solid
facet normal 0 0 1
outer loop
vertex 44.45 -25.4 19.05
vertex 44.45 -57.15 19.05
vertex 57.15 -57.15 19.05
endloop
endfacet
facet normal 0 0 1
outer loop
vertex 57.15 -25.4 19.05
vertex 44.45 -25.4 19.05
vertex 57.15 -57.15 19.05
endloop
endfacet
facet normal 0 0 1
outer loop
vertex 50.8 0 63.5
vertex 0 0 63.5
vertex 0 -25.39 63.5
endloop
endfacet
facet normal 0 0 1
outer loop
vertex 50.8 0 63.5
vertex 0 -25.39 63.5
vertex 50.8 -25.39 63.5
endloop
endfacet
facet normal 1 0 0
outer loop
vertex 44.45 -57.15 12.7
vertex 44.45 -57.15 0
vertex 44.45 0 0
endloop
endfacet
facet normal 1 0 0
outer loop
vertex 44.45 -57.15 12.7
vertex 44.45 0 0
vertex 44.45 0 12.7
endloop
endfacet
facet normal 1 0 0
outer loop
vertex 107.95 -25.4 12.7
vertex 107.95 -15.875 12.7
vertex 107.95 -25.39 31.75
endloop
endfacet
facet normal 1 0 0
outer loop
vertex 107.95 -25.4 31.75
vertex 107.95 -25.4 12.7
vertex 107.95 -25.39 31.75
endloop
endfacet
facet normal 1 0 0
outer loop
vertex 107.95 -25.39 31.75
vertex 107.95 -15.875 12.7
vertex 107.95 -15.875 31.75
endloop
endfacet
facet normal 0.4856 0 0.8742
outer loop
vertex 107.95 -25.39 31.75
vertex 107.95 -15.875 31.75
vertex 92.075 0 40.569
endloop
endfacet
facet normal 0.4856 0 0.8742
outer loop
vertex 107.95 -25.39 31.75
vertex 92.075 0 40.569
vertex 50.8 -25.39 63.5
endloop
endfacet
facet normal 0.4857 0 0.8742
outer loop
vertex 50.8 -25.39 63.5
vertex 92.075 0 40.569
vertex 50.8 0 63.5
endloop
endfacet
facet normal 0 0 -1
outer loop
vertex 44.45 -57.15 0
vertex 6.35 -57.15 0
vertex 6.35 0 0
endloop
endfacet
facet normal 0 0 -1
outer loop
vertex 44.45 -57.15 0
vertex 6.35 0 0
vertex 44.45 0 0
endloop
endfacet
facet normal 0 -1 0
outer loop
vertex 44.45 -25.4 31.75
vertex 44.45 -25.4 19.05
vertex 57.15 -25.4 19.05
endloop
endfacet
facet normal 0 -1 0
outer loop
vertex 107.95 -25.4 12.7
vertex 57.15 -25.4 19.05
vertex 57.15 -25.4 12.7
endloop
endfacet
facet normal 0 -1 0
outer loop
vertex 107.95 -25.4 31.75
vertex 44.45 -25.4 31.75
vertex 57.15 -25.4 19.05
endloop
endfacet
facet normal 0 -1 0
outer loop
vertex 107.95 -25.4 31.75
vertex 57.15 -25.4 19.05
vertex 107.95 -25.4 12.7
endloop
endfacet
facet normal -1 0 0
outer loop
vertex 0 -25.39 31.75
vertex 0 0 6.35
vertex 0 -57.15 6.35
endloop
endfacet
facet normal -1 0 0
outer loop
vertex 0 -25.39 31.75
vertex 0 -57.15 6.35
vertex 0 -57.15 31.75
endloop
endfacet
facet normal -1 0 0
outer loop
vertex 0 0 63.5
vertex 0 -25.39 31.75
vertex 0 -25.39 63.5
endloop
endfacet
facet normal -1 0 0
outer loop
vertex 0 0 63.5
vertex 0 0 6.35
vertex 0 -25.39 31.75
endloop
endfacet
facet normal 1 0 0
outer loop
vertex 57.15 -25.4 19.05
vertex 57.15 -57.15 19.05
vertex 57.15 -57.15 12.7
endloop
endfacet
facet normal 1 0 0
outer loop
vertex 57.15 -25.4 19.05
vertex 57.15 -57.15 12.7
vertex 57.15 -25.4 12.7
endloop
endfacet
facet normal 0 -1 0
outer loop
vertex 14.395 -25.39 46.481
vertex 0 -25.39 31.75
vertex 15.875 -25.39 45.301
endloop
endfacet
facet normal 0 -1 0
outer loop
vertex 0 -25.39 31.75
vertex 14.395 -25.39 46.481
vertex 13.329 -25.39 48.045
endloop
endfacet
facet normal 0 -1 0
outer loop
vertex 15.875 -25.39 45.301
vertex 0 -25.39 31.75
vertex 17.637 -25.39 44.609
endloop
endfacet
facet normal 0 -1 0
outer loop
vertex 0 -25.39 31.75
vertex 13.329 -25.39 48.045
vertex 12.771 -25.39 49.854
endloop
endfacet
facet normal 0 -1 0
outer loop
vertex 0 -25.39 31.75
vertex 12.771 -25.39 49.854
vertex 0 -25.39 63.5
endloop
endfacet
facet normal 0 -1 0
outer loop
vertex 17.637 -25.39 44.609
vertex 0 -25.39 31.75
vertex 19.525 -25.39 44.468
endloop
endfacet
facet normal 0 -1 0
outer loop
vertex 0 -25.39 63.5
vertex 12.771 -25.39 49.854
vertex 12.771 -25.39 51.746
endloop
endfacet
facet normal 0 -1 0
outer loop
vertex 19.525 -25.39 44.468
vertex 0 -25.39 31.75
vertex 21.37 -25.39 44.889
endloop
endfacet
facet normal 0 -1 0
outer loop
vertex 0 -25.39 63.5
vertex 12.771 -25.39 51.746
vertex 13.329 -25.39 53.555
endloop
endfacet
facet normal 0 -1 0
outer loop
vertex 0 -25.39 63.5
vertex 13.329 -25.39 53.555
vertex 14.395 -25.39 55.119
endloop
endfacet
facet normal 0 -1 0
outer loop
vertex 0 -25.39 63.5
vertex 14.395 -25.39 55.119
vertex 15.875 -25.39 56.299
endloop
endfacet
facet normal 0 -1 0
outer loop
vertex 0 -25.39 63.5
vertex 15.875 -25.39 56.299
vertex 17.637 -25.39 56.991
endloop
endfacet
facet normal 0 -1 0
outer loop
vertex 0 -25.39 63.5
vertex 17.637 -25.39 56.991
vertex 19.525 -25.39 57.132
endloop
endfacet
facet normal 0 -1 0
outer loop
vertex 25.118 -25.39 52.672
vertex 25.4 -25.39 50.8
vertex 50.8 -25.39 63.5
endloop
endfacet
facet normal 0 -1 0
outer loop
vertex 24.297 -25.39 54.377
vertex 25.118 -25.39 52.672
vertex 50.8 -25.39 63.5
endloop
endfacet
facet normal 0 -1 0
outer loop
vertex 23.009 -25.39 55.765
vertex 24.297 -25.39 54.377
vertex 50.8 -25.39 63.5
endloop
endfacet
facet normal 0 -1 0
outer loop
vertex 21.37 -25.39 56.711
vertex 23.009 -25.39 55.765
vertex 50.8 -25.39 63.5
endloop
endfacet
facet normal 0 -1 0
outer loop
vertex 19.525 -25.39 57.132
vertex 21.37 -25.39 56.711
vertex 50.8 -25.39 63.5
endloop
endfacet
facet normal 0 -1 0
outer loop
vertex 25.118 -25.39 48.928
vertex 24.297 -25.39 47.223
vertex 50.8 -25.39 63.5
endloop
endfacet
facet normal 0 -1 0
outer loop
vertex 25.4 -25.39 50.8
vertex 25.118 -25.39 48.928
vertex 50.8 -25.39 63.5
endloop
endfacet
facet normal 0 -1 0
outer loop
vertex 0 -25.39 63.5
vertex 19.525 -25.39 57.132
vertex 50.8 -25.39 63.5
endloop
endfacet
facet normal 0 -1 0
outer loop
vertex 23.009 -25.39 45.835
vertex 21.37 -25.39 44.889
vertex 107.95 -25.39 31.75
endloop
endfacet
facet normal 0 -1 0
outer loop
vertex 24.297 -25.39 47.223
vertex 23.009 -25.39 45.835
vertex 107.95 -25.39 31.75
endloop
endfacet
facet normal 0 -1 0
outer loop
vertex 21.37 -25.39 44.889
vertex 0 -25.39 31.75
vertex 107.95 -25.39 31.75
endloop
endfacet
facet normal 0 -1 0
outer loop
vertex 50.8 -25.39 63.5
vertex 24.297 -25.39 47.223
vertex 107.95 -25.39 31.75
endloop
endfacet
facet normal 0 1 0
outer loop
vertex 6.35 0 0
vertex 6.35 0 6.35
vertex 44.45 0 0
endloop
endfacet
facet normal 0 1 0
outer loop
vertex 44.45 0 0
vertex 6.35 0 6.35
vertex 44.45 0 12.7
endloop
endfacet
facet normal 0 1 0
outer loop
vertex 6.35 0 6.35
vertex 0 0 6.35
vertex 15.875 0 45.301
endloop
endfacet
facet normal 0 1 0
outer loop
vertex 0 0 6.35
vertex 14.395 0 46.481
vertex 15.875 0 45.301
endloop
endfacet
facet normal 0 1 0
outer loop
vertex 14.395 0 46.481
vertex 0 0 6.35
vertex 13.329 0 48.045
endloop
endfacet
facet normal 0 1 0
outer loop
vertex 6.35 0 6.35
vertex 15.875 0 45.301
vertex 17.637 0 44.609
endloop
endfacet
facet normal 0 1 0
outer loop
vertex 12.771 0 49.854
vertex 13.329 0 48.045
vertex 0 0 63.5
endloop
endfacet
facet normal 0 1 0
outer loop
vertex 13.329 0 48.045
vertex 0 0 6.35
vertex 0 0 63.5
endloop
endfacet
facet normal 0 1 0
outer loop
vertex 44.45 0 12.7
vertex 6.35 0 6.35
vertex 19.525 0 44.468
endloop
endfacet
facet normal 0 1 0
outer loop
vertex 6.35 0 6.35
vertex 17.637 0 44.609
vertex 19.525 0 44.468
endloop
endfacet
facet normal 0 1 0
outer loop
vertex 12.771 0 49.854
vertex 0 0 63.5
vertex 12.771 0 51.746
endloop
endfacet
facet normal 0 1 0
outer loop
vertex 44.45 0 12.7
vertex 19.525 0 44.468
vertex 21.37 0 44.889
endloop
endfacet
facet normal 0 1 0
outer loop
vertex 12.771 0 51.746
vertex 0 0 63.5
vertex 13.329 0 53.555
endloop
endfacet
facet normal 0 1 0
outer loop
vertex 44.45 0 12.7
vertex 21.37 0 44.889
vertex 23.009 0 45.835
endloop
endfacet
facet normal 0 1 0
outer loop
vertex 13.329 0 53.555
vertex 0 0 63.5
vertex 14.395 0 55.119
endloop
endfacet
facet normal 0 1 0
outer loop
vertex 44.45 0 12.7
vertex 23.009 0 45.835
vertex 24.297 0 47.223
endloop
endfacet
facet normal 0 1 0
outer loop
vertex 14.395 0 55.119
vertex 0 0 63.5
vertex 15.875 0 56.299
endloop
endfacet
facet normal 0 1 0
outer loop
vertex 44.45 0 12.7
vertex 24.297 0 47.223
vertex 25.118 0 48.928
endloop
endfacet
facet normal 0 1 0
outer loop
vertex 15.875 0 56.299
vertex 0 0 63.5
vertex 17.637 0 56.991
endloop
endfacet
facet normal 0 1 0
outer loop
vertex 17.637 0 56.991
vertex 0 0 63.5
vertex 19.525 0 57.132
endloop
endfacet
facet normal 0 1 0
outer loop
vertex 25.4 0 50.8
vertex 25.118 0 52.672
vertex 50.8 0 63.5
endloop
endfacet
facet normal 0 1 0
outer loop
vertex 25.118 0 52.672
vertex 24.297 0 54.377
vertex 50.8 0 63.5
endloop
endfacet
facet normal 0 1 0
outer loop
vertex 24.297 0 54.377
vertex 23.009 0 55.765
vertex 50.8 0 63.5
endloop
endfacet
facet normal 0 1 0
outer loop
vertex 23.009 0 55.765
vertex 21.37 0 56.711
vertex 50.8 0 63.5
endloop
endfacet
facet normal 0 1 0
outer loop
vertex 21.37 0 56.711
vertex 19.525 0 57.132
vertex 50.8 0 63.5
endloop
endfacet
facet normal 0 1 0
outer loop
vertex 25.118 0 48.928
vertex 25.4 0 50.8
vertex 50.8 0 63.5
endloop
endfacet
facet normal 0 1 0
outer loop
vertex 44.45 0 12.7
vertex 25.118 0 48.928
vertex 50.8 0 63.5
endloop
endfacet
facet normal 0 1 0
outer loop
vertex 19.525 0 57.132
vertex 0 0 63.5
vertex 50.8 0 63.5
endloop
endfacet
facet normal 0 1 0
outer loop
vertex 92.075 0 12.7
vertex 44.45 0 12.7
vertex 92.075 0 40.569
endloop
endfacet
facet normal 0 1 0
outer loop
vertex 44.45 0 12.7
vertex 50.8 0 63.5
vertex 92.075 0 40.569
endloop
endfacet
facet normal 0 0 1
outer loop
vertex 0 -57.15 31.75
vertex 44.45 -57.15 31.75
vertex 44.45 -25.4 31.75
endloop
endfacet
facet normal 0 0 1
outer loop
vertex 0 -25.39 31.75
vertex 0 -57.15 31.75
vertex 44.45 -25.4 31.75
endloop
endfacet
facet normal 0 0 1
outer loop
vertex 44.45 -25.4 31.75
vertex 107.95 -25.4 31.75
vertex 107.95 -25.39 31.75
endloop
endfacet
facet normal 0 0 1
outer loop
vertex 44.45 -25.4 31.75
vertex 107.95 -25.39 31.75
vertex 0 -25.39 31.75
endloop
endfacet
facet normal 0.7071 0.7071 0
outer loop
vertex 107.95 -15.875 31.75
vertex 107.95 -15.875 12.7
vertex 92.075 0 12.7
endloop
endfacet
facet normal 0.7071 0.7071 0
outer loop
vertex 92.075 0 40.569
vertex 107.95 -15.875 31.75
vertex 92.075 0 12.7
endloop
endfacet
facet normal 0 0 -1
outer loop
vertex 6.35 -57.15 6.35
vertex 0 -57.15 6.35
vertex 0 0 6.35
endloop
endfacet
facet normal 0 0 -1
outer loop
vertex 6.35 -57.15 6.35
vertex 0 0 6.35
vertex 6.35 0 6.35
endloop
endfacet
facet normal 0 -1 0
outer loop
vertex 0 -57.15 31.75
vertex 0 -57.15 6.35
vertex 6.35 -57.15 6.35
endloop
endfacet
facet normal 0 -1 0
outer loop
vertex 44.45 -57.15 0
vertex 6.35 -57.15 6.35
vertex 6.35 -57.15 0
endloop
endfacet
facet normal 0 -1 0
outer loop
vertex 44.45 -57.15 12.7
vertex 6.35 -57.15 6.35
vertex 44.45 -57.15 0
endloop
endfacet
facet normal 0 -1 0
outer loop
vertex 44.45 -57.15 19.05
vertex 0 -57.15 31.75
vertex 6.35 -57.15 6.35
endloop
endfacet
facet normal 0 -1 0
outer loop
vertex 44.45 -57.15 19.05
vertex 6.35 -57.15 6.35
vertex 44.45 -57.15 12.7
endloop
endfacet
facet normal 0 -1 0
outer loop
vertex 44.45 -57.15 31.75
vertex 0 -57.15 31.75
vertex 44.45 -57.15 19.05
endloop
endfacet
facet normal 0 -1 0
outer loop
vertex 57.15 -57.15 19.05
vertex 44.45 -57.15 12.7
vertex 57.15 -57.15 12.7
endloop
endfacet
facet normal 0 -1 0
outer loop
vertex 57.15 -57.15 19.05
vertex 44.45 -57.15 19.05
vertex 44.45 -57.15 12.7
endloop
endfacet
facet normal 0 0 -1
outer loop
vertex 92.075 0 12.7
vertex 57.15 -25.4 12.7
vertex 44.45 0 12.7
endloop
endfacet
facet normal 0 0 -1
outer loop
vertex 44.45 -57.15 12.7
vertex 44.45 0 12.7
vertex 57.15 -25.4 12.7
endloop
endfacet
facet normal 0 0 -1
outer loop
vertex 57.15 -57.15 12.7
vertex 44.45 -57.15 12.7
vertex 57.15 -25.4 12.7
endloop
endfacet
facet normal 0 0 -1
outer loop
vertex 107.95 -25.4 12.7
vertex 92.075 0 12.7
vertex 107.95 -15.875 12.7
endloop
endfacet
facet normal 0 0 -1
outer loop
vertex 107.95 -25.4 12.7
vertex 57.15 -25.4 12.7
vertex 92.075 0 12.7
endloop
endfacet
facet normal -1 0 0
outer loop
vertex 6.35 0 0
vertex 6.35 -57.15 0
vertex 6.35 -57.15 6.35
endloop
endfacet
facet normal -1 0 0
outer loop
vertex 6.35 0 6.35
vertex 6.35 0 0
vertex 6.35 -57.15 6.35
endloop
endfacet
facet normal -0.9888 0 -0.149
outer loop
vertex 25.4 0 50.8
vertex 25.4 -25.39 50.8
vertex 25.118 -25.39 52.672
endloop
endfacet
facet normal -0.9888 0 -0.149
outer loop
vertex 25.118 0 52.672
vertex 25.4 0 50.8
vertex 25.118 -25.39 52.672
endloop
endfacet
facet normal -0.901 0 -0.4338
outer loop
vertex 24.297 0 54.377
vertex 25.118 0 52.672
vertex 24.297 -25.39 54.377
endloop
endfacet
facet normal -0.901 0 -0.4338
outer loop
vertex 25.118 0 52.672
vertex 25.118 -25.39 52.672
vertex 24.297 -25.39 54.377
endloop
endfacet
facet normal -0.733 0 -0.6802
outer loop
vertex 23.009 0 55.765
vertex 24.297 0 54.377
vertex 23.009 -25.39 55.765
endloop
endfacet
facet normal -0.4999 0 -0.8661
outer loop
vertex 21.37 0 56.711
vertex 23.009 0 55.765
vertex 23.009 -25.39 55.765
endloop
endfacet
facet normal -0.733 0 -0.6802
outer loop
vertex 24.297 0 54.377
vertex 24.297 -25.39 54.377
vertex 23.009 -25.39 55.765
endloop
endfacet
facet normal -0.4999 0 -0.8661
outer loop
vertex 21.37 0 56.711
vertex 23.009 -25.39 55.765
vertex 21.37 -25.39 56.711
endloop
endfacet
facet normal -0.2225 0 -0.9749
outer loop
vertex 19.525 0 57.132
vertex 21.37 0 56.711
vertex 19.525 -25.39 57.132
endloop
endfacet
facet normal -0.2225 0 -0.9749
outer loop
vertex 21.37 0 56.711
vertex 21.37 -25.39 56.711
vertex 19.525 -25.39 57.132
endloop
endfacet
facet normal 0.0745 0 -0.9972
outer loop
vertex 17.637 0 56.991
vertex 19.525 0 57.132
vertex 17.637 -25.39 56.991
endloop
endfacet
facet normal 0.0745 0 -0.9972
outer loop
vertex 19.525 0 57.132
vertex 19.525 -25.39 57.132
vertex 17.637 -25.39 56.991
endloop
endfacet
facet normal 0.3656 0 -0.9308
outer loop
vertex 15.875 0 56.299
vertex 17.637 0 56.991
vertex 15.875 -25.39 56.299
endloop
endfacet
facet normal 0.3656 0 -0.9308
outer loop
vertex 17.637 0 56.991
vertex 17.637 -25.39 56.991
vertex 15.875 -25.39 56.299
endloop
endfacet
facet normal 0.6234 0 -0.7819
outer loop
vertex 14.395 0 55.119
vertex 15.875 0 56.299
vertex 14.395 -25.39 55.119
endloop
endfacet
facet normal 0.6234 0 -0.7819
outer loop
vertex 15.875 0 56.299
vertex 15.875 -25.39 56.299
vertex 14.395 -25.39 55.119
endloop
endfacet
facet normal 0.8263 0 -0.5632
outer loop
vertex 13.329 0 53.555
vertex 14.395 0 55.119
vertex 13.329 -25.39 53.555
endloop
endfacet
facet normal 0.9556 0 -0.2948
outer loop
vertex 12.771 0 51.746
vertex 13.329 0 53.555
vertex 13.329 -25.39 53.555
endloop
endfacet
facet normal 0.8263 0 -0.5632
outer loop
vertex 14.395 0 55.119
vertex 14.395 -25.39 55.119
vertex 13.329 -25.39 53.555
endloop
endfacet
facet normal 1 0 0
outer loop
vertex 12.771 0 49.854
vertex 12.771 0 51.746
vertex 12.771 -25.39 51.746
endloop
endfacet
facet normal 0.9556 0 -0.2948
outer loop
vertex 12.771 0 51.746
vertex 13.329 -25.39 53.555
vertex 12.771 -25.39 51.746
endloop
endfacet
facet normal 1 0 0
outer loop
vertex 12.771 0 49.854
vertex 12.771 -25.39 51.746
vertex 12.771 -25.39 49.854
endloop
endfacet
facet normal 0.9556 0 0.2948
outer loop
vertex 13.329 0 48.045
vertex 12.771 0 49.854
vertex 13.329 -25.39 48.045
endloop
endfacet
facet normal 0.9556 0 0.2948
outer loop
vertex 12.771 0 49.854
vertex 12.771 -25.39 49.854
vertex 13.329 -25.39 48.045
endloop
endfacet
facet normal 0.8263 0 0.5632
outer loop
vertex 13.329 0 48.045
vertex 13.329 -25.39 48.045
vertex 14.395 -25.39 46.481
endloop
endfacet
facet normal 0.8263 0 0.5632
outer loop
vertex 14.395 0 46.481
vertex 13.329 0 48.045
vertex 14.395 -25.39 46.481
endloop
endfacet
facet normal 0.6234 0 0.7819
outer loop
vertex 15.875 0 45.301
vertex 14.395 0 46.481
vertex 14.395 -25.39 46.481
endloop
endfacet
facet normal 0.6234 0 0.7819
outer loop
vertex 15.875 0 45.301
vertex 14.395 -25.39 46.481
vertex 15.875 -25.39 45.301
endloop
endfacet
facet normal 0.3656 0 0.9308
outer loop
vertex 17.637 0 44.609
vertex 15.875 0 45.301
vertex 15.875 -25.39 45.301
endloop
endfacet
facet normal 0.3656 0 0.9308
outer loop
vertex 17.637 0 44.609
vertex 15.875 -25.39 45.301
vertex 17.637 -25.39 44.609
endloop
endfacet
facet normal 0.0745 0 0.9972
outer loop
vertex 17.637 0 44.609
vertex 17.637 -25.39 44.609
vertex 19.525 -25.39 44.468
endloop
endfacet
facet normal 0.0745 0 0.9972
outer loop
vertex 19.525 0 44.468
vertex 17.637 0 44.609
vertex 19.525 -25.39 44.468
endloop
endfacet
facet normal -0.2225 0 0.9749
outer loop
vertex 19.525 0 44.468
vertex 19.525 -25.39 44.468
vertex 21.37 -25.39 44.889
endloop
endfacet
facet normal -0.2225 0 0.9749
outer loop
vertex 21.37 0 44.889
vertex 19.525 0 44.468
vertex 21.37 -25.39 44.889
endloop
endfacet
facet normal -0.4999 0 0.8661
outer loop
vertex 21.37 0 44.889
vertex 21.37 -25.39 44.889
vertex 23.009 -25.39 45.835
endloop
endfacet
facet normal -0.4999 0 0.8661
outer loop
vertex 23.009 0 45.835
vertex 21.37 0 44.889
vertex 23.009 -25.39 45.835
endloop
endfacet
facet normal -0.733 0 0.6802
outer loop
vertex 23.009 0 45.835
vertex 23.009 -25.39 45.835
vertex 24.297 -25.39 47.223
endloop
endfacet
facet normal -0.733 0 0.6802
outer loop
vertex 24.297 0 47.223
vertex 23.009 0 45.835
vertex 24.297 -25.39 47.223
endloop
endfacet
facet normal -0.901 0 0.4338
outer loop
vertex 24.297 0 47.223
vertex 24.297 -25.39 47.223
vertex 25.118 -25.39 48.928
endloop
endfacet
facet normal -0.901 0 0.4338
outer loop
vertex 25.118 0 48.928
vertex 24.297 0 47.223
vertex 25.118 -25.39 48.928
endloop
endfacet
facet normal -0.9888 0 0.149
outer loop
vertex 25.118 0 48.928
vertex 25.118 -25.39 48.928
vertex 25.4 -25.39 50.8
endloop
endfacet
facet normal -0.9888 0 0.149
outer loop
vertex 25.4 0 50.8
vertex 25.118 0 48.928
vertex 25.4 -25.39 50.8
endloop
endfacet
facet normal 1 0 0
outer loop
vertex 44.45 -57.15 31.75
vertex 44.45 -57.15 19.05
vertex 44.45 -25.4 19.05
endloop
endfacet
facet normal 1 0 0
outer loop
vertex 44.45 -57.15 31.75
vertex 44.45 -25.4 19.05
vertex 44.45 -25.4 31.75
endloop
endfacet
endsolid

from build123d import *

# Parameters (mm, degrees)
F0_W      = 107.95
F0_H      = 63.5
F1_DEPTH  = 57.15
F2_W      = 6.35
F2_H      = 6.35
F3_DEPTH  = 57.151
F4_W      = 63.5
F4_H      = 12.7
F5_DEPTH  = 57.151
F6_W      = 31.7601591736
F6_H      = 31.75
F7_DEPTH  = 107.951
F8_W      = 12.7
F8_H      = 12.7
F9_DEPTH  = 31.75
F10_W     = 50.8
F10_H     = 12.7
F11_DEPTH = 31.75
F13_DEPTH = 57.151
F15_DEPTH = 50.801
F16_R     = 6.35
F17_DEPTH = 25.3908408264
F18_W     = 50.8
F18_H     = 31.75
F19_DEPTH = 19.051


with BuildPart() as f1:
    # F0 (on Front) → F1 (new body)
    with BuildSketch(Plane.XZ):
        with Locations((53.975, 31.75)):
            Rectangle(F0_W, F0_H)
    extrude(amount=F1_DEPTH)

    # F2 (on face) → F3 (cut, through all)
    with BuildSketch(Plane.XZ.offset(57.15)):
        with Locations((3.175, 3.175)):
            Rectangle(F2_W, F2_H)
    extrude(amount=-F3_DEPTH, mode=Mode.SUBTRACT)

    # F4 (on face) → F5 (cut, through all)
    with BuildSketch(Plane.XZ.offset(57.15)):
        with Locations((76.2, 6.35)):
            Rectangle(F4_W, F4_H)
    extrude(amount=-F5_DEPTH, mode=Mode.SUBTRACT)

    # F6 (on face) → F7 (cut, through all)
    with BuildSketch(Plane.YZ.offset(107.95)):
        with Locations((-41.2699204132, 47.625)):
            Rectangle(F6_W, F6_H)
    extrude(amount=-F7_DEPTH, mode=Mode.SUBTRACT)

    # F8 (on face) → F9 (cut)
    with BuildSketch(Plane.XZ.offset(57.15)):
        with Locations((50.8, 25.4)):
            Rectangle(F8_W, F8_H)
    extrude(amount=-F9_DEPTH, mode=Mode.SUBTRACT)

    # F10 (on face) → F11 (cut)
    with BuildSketch(Plane.XZ.offset(57.15)):
        with Locations((82.55, 25.4)):
            Rectangle(F10_W, F10_H)
    extrude(amount=-F11_DEPTH, mode=Mode.SUBTRACT)

    # F12 (on face) → F13 (cut, through all)
    with BuildSketch(Plane(origin=(0, 0, 0), x_dir=(-1, 0, 0), z_dir=(0, 1, 0))):
        Polygon((-107.95, 63.5), (-107.95, 31.75), (-50.8, 63.5), align=None)
    extrude(amount=-F13_DEPTH, mode=Mode.SUBTRACT)

    # F14 (on face) → F15 (cut, through all)
    with BuildSketch(Plane(origin=(0, 0, 12.7), x_dir=(1, 0, 0), z_dir=(0, 0, -1))):
        Polygon((92.075, 0), (107.95, 0), (107.95, 15.875), align=None)
    extrude(amount=-F15_DEPTH, mode=Mode.SUBTRACT)

    # F16 (on face) → F17 (cut, through all)
    with BuildSketch(Plane.XZ.offset(25.3898408264)):
        with Locations((19.05, 50.8)):
            Circle(F16_R)
    extrude(amount=-F17_DEPTH, mode=Mode.SUBTRACT)

    # F18 (on face) → F19 (cut, through all)
    with BuildSketch(Plane.XY.offset(19.05)):
        with Locations((82.55, -41.275)):
            Rectangle(F18_W, F18_H)
    extrude(amount=-F19_DEPTH, mode=Mode.SUBTRACT)


solid = f1.part
